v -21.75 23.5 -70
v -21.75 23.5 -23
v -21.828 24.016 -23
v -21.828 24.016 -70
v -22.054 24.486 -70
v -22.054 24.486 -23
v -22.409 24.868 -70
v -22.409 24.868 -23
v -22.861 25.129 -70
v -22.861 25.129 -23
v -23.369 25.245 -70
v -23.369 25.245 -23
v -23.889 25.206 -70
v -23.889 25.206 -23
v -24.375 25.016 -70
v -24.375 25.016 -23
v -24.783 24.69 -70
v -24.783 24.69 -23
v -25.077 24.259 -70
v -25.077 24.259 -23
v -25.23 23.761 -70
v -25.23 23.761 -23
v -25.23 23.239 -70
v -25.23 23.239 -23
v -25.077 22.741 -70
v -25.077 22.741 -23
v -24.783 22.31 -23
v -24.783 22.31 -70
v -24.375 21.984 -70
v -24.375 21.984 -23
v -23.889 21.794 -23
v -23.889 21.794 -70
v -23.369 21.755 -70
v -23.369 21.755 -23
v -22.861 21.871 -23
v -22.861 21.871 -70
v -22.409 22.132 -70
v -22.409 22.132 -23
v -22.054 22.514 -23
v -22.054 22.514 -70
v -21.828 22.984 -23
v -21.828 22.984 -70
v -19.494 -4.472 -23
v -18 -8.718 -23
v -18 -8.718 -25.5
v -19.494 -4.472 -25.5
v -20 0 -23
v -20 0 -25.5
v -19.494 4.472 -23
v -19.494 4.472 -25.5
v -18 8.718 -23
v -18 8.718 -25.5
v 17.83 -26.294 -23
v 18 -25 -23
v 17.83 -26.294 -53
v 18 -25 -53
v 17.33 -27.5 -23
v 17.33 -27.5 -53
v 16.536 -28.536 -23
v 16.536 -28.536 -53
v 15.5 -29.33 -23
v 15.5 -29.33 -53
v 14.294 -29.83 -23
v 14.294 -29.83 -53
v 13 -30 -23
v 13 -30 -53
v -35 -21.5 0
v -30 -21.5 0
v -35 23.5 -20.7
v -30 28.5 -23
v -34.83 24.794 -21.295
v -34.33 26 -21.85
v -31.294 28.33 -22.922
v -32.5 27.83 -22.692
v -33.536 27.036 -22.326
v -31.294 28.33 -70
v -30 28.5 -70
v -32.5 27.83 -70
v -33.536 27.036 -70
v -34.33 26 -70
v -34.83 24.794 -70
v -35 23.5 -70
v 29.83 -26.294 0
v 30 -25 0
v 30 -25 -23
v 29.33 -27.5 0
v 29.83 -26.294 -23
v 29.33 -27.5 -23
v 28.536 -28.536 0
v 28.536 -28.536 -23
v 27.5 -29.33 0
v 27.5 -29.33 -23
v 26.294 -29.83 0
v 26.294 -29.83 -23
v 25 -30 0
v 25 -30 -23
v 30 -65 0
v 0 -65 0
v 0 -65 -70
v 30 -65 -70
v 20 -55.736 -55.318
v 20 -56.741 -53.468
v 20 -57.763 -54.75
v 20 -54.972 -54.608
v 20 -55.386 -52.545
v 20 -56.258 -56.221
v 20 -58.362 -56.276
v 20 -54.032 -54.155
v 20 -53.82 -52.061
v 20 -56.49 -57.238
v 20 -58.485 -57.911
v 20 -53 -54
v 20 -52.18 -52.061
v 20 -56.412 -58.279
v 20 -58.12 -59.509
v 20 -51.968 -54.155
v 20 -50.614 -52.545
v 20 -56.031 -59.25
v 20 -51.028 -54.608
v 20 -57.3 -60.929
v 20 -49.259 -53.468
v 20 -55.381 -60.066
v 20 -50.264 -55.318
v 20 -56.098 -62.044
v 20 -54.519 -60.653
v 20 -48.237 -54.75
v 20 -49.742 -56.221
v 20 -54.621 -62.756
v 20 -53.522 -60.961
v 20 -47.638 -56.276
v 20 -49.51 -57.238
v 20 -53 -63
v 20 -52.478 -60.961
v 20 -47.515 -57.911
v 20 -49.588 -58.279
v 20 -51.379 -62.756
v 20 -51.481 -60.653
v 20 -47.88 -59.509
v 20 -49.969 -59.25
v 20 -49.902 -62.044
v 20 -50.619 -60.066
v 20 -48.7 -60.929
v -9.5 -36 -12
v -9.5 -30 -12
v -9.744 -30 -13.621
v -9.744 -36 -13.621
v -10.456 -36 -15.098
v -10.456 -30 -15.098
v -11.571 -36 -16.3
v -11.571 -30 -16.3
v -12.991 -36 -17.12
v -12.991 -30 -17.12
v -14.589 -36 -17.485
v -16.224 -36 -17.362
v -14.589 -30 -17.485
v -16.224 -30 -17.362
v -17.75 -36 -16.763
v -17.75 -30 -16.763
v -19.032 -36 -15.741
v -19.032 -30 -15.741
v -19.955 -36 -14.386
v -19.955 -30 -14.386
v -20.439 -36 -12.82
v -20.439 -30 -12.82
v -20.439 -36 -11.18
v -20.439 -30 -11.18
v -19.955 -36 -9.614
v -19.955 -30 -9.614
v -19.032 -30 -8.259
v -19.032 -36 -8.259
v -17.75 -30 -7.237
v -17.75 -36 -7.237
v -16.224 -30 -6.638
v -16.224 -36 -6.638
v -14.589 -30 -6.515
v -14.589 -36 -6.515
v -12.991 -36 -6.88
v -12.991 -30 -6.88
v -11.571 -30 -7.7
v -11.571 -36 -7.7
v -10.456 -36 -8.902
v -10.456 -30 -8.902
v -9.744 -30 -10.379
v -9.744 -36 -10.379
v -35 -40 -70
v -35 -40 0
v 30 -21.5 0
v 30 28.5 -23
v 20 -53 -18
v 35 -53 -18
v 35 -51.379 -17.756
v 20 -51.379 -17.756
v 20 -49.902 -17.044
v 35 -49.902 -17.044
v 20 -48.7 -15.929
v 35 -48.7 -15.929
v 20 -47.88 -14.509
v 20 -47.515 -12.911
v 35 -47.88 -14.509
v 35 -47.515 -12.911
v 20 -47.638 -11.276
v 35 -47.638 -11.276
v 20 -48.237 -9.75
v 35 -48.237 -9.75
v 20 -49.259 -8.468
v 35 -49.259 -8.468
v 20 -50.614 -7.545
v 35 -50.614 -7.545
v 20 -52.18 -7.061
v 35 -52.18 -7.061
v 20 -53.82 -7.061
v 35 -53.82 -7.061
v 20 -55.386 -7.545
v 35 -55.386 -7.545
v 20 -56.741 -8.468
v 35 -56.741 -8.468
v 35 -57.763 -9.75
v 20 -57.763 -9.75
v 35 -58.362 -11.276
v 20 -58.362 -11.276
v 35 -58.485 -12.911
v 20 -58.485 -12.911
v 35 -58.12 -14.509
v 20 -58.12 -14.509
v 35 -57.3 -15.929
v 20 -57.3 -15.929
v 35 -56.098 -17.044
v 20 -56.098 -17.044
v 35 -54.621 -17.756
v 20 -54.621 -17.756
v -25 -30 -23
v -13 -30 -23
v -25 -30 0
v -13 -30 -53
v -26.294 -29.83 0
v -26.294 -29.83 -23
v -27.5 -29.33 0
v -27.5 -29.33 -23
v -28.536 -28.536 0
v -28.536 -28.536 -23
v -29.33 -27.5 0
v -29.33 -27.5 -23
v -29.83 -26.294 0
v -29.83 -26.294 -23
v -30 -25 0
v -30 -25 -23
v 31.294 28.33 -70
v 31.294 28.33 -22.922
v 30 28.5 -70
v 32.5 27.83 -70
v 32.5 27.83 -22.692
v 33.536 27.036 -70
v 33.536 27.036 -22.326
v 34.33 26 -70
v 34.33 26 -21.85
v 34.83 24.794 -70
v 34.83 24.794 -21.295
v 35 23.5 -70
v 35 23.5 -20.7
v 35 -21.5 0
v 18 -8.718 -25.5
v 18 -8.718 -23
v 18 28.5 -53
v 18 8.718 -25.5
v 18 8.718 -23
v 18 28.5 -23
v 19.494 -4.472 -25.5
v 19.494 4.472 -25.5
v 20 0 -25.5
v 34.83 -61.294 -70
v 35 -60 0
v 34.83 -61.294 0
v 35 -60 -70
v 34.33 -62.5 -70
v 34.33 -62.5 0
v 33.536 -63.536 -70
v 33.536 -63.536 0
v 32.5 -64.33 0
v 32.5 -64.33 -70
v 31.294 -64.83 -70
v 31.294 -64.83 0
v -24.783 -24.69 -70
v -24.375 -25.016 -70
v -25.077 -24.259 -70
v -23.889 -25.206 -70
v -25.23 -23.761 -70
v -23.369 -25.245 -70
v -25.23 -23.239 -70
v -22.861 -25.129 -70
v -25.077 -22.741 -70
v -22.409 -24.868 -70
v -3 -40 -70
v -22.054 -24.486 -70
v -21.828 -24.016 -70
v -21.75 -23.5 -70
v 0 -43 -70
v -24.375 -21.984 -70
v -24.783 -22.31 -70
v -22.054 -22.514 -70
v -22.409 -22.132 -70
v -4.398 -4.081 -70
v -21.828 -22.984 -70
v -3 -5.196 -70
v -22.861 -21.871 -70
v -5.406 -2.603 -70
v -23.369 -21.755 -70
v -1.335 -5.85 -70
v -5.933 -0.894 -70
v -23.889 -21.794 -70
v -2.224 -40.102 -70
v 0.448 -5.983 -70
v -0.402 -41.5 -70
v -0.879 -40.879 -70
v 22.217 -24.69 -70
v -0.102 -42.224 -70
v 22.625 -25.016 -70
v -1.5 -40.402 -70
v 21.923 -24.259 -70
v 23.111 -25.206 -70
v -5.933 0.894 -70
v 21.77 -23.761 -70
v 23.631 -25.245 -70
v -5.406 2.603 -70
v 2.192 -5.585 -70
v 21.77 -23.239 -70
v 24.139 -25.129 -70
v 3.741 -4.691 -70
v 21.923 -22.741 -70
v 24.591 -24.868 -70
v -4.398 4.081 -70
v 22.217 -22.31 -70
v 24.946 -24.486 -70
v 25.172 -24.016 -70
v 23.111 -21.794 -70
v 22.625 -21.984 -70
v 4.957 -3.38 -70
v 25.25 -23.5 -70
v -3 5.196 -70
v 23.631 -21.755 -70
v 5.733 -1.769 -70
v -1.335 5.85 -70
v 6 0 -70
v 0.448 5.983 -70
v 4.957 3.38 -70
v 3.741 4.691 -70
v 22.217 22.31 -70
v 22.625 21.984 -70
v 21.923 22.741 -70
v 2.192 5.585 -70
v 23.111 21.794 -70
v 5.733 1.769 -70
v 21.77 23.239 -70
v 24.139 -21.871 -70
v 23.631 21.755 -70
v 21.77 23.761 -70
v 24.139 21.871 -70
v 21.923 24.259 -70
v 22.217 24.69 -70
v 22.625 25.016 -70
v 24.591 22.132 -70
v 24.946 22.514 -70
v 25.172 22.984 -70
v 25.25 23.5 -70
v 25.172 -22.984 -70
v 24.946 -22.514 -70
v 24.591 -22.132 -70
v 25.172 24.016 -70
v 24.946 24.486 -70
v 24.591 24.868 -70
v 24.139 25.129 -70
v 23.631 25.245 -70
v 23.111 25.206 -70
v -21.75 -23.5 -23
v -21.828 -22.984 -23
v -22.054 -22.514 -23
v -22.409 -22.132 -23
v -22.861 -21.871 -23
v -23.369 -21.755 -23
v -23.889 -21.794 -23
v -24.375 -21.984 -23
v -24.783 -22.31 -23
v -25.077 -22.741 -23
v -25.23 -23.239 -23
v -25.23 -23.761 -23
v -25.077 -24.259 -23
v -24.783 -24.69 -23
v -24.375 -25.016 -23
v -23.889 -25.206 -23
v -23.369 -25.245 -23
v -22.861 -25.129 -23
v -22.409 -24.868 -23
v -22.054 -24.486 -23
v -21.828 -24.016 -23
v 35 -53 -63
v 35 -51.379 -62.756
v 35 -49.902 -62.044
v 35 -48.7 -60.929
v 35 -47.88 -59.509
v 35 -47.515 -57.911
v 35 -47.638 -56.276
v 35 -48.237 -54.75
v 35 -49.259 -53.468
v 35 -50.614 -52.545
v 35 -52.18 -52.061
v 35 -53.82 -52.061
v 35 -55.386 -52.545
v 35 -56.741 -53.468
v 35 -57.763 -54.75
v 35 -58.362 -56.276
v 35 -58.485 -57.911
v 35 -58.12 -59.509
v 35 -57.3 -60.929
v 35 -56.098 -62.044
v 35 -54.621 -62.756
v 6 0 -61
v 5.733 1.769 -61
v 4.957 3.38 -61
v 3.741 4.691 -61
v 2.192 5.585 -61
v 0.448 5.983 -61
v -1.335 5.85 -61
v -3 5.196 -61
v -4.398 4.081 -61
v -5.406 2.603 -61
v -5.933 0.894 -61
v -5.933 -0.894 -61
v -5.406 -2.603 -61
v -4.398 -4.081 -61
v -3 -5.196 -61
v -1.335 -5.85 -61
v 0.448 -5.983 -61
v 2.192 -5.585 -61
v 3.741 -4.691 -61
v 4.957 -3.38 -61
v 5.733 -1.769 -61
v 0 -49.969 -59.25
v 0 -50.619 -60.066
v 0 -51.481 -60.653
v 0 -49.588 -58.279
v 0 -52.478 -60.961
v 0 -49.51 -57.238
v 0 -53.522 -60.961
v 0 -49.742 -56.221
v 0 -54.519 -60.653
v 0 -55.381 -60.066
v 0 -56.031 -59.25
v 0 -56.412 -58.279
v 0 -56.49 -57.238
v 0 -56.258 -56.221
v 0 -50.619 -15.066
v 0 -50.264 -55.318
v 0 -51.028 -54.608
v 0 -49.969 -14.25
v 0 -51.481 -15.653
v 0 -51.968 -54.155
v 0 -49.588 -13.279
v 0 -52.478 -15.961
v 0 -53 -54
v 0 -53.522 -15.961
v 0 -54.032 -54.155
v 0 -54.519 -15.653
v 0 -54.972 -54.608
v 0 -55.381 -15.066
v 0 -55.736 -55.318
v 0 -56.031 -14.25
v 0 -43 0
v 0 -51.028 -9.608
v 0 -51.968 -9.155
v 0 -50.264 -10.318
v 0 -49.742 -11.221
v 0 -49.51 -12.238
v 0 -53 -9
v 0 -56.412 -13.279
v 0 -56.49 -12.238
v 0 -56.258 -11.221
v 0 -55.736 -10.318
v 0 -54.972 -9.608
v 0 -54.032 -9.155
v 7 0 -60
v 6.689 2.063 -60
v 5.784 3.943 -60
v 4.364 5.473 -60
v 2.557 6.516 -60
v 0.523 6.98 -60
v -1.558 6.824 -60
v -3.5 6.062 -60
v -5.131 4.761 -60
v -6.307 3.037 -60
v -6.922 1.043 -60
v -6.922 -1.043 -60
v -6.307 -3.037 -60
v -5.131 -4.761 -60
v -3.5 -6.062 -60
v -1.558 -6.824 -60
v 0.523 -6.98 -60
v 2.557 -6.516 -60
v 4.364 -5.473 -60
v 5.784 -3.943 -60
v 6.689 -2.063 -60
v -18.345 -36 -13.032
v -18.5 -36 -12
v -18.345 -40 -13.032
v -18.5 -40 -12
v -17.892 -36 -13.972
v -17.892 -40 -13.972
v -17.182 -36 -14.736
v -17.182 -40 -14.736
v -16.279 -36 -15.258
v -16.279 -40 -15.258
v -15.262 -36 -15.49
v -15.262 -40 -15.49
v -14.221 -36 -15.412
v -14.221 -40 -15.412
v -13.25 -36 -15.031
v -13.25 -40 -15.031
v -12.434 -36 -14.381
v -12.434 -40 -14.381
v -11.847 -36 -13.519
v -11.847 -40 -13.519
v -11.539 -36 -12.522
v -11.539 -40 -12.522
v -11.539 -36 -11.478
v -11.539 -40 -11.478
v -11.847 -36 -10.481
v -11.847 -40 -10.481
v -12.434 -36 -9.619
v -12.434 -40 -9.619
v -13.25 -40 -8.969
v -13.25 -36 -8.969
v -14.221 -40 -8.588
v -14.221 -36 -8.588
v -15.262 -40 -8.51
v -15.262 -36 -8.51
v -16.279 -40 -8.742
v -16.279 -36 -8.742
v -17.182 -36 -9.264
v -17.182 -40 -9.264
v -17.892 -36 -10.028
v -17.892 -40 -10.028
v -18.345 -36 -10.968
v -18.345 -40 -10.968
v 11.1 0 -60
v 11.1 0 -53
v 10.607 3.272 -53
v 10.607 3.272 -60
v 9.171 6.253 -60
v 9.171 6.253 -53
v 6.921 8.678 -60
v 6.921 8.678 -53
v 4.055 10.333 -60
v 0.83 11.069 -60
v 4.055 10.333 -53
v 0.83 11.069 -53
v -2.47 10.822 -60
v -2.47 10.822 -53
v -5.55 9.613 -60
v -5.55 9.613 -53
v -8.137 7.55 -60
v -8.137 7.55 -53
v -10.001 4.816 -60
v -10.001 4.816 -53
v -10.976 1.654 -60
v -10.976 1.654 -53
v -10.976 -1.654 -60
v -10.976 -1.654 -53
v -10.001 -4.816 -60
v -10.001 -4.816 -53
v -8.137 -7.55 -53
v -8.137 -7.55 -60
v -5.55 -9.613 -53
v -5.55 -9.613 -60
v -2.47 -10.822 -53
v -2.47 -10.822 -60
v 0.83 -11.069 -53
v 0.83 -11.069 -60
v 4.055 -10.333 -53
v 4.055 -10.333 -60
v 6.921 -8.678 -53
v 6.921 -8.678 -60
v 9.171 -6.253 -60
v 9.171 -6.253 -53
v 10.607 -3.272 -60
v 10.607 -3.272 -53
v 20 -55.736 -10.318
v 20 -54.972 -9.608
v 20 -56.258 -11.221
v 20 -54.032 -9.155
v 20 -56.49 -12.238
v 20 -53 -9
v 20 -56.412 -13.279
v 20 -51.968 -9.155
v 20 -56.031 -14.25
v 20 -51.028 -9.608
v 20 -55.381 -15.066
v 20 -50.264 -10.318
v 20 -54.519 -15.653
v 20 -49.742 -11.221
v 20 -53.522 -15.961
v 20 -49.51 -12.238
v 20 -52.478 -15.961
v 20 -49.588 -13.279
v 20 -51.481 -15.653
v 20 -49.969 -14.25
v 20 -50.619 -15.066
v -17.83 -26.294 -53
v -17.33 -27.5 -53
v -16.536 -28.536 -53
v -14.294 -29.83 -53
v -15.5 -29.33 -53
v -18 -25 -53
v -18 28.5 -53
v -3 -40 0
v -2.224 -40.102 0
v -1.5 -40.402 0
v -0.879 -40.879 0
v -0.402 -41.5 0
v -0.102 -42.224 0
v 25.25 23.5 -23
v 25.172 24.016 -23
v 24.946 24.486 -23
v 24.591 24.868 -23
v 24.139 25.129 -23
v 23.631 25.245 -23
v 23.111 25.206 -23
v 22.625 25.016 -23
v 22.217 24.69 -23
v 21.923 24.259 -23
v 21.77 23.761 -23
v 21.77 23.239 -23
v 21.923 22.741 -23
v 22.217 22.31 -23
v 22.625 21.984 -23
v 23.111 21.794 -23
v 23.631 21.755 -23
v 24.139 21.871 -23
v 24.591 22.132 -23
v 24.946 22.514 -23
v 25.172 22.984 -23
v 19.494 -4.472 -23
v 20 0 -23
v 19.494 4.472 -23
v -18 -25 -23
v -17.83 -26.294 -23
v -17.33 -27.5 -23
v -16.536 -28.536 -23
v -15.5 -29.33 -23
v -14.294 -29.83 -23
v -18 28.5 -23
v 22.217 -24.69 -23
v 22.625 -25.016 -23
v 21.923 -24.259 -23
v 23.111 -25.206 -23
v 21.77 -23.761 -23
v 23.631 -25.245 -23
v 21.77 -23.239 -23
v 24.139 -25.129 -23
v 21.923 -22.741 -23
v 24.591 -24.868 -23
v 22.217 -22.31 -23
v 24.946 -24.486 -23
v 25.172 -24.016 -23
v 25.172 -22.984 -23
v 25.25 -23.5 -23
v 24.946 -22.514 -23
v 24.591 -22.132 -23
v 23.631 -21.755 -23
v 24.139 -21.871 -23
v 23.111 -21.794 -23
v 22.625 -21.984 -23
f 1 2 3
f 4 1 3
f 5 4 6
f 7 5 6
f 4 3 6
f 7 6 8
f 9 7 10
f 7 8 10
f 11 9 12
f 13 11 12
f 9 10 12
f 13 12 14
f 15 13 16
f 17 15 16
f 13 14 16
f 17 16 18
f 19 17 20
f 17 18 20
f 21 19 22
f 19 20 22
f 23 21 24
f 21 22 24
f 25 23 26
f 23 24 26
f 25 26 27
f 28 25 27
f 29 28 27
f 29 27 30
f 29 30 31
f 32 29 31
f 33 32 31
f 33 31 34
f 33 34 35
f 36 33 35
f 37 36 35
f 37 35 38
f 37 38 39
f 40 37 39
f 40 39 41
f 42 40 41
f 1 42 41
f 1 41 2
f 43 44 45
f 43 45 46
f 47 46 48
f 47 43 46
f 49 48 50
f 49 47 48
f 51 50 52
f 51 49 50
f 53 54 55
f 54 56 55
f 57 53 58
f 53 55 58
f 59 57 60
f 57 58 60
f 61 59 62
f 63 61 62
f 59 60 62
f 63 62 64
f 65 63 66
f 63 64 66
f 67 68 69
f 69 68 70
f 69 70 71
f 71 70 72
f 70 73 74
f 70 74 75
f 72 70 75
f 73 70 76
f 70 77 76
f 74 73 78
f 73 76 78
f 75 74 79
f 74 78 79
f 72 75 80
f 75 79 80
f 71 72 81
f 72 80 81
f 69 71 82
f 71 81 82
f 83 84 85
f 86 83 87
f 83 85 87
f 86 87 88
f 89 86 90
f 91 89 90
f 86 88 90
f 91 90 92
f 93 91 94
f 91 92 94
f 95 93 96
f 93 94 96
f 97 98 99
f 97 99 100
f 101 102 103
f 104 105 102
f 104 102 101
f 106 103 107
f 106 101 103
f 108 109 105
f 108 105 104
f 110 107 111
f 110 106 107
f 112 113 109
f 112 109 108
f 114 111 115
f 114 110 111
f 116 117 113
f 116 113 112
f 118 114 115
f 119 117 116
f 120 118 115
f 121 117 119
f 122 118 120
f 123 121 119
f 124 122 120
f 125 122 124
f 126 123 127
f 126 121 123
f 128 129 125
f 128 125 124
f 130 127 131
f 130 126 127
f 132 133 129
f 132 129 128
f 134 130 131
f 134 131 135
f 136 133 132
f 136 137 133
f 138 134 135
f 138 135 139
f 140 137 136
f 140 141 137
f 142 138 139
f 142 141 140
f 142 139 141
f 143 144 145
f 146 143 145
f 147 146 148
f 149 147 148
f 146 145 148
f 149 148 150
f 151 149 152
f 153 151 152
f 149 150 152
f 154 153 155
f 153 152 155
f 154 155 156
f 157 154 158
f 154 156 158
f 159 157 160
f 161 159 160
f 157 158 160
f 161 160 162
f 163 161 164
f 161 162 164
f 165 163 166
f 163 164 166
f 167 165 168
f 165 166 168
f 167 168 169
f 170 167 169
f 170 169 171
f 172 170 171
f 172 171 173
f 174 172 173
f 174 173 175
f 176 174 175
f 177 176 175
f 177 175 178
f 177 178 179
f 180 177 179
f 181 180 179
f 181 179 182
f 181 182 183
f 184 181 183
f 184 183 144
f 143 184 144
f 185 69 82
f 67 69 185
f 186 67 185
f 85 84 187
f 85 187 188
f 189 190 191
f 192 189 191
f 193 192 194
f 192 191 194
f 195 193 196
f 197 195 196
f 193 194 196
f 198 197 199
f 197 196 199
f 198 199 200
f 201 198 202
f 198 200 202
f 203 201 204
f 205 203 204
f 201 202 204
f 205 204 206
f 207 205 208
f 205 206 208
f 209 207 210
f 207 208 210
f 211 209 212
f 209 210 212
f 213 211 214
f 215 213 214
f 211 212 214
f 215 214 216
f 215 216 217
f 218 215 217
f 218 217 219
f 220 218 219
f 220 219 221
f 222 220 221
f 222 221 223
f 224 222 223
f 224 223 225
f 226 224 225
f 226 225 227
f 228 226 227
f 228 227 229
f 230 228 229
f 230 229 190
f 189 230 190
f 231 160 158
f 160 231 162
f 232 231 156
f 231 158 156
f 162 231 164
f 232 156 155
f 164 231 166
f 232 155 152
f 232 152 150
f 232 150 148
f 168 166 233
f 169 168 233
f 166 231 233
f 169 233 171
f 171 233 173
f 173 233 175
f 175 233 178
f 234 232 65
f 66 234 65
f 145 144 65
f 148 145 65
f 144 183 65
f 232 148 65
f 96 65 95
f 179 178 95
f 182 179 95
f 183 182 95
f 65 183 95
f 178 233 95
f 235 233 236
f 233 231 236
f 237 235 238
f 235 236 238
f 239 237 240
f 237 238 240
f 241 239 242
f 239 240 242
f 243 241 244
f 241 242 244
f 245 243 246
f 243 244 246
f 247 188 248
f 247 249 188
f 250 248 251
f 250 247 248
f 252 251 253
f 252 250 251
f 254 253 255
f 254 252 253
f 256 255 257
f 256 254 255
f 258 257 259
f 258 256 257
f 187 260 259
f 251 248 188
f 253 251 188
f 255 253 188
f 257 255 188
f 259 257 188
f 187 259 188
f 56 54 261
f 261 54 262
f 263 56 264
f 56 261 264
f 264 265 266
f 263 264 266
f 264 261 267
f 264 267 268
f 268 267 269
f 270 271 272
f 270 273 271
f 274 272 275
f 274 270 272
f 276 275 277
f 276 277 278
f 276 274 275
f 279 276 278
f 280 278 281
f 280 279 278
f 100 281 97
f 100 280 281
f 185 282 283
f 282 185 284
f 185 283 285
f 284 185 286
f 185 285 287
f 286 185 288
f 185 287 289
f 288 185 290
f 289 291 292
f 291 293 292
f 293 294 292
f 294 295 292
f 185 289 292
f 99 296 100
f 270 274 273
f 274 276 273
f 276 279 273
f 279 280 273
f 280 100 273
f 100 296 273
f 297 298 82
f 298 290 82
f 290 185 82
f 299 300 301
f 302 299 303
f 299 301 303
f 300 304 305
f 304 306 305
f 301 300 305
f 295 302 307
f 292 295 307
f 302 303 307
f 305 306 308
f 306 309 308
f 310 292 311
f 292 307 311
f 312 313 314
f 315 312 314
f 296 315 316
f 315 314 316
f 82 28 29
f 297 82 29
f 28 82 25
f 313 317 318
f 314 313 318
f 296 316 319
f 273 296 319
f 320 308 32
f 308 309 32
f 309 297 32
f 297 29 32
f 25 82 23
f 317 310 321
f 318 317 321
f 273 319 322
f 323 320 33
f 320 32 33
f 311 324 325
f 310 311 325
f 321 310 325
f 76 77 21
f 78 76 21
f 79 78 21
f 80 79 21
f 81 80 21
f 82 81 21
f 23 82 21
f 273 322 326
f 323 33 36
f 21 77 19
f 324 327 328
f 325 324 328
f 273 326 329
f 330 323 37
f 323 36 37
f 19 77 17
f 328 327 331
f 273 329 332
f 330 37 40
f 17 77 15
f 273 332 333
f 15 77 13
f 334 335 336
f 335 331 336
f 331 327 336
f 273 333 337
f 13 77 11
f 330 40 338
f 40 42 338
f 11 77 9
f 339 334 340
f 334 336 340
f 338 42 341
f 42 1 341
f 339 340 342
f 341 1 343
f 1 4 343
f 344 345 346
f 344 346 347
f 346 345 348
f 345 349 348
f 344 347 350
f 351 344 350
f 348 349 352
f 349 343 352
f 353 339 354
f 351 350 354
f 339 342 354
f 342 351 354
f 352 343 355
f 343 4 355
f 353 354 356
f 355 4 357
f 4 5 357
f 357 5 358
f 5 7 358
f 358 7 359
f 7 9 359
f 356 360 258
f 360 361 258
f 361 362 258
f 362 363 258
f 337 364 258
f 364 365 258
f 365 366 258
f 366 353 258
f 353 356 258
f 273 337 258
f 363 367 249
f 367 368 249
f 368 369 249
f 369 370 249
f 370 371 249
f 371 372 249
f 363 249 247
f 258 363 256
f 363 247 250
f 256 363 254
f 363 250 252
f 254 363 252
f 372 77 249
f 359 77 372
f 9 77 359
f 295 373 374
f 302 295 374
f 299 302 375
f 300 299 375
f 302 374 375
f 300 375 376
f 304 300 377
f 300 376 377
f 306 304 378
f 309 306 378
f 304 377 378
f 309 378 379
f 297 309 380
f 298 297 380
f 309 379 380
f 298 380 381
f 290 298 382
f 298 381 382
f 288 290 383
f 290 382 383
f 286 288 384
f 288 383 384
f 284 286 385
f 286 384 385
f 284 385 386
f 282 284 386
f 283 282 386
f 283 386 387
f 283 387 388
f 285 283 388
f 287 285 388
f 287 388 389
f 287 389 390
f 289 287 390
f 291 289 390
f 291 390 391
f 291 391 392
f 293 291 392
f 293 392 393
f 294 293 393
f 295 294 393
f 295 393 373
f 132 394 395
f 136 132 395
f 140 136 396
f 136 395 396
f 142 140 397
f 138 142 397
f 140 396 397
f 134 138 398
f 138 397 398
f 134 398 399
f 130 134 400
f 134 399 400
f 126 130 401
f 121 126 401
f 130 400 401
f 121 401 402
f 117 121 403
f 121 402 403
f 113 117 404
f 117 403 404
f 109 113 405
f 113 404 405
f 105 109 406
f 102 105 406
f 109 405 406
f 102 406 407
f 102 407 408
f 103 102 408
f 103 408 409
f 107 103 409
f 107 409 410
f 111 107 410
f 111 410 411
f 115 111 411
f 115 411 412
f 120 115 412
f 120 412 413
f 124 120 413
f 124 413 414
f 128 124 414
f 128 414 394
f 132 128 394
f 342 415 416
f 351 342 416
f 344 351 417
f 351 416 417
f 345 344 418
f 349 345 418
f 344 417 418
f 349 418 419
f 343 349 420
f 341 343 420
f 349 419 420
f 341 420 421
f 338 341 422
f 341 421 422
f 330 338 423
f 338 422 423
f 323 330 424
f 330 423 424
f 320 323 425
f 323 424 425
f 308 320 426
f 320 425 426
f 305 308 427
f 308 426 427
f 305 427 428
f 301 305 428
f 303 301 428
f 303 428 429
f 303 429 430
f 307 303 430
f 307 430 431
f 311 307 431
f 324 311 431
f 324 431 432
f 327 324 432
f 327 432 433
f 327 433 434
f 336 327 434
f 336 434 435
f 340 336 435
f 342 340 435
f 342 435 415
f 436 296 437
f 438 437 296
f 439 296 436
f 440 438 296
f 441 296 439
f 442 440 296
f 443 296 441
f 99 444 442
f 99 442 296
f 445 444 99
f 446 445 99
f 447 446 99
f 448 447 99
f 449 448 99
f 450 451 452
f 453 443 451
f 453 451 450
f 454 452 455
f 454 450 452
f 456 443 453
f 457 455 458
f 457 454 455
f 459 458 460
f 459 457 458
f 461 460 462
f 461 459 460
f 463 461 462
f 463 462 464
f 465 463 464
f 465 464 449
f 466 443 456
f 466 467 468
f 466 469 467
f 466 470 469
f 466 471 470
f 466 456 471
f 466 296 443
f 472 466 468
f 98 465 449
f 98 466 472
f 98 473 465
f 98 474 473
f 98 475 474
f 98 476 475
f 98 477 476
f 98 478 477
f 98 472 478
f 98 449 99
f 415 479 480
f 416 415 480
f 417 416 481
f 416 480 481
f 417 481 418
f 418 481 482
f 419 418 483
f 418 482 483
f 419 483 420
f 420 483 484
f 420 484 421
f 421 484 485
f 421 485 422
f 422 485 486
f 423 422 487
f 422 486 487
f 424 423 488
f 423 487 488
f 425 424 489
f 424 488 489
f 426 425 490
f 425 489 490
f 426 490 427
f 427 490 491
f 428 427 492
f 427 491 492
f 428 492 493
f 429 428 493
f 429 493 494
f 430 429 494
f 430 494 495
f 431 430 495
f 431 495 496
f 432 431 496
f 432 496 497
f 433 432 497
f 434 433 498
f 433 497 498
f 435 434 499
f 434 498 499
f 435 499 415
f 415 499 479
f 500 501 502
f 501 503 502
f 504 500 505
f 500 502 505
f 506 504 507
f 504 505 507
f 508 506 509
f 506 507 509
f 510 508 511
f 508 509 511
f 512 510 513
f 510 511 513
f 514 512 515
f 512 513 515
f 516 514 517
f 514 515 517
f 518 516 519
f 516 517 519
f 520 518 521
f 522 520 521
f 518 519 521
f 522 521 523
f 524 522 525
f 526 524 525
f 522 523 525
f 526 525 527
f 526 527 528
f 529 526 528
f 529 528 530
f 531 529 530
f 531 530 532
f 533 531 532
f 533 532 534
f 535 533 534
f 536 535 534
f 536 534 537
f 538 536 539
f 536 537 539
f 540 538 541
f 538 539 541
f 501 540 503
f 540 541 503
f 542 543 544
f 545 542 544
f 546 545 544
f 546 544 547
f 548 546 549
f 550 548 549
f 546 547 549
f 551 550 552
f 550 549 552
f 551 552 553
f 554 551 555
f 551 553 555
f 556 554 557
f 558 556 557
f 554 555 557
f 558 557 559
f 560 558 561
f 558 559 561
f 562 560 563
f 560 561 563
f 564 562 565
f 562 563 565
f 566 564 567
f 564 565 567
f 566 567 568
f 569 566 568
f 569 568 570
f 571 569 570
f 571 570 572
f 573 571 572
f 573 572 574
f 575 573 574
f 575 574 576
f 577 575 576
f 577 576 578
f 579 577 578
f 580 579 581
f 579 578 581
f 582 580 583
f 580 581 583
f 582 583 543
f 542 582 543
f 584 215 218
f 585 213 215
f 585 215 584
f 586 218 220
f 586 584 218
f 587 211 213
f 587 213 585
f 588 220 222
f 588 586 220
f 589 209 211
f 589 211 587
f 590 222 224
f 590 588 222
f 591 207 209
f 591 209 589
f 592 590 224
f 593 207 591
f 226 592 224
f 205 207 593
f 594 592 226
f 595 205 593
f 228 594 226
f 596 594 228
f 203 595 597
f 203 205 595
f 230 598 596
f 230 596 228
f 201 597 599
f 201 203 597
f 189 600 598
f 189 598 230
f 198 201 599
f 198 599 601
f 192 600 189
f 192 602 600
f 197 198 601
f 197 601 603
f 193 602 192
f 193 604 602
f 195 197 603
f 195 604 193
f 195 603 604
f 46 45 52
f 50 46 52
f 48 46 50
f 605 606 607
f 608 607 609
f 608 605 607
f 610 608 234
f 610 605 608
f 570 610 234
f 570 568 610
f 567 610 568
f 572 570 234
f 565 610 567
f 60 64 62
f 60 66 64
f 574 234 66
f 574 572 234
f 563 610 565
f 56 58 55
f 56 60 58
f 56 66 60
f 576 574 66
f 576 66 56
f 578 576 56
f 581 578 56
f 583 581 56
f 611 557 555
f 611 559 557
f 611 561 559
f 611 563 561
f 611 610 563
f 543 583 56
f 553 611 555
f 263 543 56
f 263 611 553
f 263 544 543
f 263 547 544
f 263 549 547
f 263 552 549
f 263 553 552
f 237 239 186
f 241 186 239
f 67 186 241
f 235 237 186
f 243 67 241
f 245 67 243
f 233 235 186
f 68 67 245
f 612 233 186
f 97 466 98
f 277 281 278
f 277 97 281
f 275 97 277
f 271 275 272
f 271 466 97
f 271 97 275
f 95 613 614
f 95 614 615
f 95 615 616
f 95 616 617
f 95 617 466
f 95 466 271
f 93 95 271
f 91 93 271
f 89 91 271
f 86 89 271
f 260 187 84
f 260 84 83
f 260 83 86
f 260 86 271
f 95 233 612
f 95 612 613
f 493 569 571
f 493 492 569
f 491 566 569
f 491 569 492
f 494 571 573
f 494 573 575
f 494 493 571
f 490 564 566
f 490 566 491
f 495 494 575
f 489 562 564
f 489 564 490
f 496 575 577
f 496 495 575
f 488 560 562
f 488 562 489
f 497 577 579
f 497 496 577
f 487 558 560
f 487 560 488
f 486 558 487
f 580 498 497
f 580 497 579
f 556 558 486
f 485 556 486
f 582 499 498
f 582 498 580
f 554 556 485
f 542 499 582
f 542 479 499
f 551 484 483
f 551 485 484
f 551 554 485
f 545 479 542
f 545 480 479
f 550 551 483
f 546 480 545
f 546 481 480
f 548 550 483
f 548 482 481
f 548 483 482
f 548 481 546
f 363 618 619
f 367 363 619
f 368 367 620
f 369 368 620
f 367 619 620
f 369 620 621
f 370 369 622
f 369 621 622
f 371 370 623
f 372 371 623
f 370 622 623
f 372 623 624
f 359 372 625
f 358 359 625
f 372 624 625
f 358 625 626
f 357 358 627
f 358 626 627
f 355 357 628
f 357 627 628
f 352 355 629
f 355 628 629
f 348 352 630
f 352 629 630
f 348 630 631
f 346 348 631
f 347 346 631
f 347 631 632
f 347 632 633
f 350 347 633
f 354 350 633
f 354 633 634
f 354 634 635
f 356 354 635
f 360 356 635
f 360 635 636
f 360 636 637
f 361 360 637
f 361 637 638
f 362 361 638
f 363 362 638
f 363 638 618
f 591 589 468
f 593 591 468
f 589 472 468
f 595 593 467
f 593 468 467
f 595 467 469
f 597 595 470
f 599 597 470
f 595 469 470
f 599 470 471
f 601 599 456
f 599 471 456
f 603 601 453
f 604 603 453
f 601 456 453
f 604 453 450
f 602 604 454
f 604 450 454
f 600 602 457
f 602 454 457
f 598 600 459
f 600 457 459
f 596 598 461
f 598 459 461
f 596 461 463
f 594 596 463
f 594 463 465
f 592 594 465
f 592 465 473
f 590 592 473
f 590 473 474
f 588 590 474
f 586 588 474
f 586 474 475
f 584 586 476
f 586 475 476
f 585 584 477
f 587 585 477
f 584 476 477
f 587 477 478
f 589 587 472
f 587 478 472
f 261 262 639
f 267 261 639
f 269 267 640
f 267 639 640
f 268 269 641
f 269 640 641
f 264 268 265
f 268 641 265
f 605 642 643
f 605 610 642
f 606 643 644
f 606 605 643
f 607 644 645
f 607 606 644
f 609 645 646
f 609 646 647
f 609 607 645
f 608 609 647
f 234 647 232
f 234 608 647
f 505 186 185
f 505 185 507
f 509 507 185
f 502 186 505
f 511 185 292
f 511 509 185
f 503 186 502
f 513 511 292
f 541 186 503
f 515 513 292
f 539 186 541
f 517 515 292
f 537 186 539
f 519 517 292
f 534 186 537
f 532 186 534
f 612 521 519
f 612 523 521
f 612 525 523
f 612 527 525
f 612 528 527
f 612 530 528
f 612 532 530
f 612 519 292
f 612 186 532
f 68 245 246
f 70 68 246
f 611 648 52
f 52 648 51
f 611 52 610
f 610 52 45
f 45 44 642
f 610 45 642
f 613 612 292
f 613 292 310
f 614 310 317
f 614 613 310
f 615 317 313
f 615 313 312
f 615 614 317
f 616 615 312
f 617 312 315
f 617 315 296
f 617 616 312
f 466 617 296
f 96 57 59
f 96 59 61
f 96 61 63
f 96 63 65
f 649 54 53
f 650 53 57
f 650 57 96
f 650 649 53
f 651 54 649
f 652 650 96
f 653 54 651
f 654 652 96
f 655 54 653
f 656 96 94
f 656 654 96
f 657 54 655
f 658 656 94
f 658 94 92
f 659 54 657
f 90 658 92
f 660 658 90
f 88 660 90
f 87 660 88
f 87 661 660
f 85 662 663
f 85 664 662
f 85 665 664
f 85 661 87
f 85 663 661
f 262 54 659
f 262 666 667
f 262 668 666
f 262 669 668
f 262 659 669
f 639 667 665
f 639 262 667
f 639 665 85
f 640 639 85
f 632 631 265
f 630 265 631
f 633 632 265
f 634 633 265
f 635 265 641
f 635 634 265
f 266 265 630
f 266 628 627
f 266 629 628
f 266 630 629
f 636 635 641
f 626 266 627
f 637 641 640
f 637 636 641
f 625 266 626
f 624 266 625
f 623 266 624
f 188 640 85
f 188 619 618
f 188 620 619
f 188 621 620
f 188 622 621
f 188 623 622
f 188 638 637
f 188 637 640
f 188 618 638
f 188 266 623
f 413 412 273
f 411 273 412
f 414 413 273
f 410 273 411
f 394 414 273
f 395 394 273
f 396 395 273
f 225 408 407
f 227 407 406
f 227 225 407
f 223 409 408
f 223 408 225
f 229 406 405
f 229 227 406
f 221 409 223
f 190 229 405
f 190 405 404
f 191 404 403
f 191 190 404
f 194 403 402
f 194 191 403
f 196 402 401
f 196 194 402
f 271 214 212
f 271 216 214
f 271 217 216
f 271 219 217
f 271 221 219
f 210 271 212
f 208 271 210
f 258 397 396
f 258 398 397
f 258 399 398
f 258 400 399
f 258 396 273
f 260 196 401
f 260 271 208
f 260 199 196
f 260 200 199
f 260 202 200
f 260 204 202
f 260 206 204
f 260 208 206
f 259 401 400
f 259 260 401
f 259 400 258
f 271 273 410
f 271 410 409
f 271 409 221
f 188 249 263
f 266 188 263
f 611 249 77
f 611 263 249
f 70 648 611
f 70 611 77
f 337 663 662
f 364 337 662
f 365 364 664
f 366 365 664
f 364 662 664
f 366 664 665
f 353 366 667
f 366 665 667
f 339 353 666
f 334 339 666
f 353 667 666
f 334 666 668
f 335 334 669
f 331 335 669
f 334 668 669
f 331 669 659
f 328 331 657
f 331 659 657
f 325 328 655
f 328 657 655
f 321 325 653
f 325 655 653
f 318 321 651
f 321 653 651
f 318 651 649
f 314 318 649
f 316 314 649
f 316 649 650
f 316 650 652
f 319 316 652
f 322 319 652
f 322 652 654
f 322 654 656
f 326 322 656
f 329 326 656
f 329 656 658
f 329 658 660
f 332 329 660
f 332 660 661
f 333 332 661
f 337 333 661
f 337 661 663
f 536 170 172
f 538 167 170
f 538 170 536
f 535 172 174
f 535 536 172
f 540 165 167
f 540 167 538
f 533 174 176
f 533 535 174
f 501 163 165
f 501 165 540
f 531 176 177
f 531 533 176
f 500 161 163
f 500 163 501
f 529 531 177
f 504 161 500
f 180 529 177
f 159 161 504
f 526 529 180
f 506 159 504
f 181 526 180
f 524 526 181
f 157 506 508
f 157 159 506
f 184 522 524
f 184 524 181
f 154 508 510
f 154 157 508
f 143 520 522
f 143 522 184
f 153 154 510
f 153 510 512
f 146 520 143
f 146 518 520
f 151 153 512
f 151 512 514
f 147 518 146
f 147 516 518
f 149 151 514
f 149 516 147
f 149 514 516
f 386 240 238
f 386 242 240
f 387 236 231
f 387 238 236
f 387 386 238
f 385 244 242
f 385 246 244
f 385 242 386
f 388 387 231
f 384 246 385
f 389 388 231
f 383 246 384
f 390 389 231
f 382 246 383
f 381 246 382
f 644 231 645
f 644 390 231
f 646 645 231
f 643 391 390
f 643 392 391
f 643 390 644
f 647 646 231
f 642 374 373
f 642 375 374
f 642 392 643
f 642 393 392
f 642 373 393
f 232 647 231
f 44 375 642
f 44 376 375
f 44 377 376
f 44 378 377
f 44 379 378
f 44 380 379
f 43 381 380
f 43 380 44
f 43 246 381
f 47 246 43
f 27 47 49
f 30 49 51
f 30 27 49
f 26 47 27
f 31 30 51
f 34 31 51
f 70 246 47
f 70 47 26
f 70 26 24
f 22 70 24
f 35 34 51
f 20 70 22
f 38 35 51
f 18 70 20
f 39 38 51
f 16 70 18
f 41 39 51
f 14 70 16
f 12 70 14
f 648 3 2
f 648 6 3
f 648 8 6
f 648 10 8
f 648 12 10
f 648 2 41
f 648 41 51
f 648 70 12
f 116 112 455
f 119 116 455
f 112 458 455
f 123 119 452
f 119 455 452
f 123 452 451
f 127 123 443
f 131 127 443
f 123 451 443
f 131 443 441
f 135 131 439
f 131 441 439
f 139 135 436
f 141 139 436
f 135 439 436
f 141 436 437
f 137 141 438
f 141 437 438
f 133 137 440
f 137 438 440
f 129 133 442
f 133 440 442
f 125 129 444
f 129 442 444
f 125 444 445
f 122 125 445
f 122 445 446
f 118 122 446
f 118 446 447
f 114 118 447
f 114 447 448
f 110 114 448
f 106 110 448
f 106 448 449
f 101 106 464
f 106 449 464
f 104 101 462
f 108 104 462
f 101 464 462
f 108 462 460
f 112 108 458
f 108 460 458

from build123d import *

# Parameters (mm, degrees)
SKETCH1_R                                       = 1.75
SKETCH1_R_2                                     = 6
BOSS_EXTRUDE1_DEPTH                             = 70
SKETCH2_W                                       = 60
SKETCH2_H                                       = 58.5
CUT_EXTRUDE2_DEPTH                              = 23
CUT_EXTRUDE3_DEPTH                              = 53
CUT_EXTRUDE5_START                              = -23
CUT_EXTRUDE5_DEPTH                              = 2.5
SKETCH5_R                                       = 11.1
CUT_EXTRUDE4_DEPTH                              = 7
CHAMFER1_SIZE                                   = 50
CHAMFER1_SIZE2                                  = 23
FILLET1_R                                       = 5
FILLET2_R                                       = 5
CBORE_FOR_M6_SOCKET_HEAD_CAP_SCREW1_D           = 7
CBORE_FOR_M6_SOCKET_HEAD_CAP_SCREW1_CBORE_D     = 11
CBORE_FOR_M6_SOCKET_HEAD_CAP_SCREW1_CBORE_DEPTH = 6
CBORE_FOR_M6_SOCKET_HEAD_CAP_SCREW2_D           = 7
CBORE_FOR_M6_SOCKET_HEAD_CAP_SCREW2_CBORE_D     = 11
CBORE_FOR_M6_SOCKET_HEAD_CAP_SCREW2_CBORE_DEPTH = 15
CHAMFER2_SIZE                                   = 1


with BuildPart() as part:
    # Sketch1 → Boss-Extrude1 (new body)
    with BuildSketch(Plane.XY):
        with BuildLine():
            Line((35, 28.5), (-35, 28.5))
            Line((-35, 28.5), (-35, -25))
            Line((-35, -25), (-35, -40))
            Line((-35, -40), (-3, -40))
            ThreePointArc((-3, -40), (-0.878679656, -40.878679656), (0, -43))
            Line((0, -43), (0, -65))
            Line((0, -65), (35, -65))
            Line((35, -65), (35, -25))
            Line((35, -25), (35, 28.5))
        make_face()
        with Locations((-23.5, -23.5)):
            Circle(SKETCH1_R, mode=Mode.SUBTRACT)
        with Locations((23.5, -23.5)):
            Circle(SKETCH1_R, mode=Mode.SUBTRACT)
        Circle(SKETCH1_R_2, mode=Mode.SUBTRACT)
        with Locations((-23.5, 23.5)):
            Circle(SKETCH1_R, mode=Mode.SUBTRACT)
        with Locations((23.5, 23.5)):
            Circle(SKETCH1_R, mode=Mode.SUBTRACT)
    extrude(amount=-BOSS_EXTRUDE1_DEPTH)

    # Sketch2 → Cut-Extrude2 (cut)
    with BuildSketch(Plane.XY):
        with Locations((0, -0.75)):
            Rectangle(SKETCH2_W, SKETCH2_H)
    extrude(amount=-CUT_EXTRUDE2_DEPTH, mode=Mode.SUBTRACT)

    # Sketch6 → Cut-Extrude3 (cut)
    with BuildSketch(Plane.XY):
        Polygon((-18, -8.717797887), (-18, -30), (18, -30), (18, -8.717797887), (18, 8.717797887), (18, 28.5), (-18, 28.5), (-18, 8.717797887), align=None)
    extrude(amount=-CUT_EXTRUDE3_DEPTH, mode=Mode.SUBTRACT)

    # Sketch6<4> → Cut-Extrude5 (cut)
    with BuildSketch(Plane.XY.offset(CUT_EXTRUDE5_START)):
        with BuildLine():
            Line((-18, 8.717797887), (-18, -8.717797887))
            ThreePointArc((-18, -8.717797887), (-20, 0), (-18, 8.717797887))
        make_face()
        with BuildLine():
            Line((18, 8.717797887), (18, -8.717797887))
            ThreePointArc((18, -8.717797887), (20, 0), (18, 8.717797887))
        make_face()
    extrude(amount=-CUT_EXTRUDE5_DEPTH, mode=Mode.SUBTRACT)

    # Sketch5 → Cut-Extrude4 (cut)
    with BuildSketch(Plane.XY.offset(-53)):
        Circle(SKETCH5_R)
    extrude(amount=-CUT_EXTRUDE4_DEPTH, mode=Mode.SUBTRACT)

    # Chamfer1
    chamfer1_edges = [part.edges().sort_by_distance(p)[0] for p in [
        (32.5, 28.5, 0),
        (-32.5, 28.5, 0),
    ]]
    chamfer1_side = [part.faces().sort_by_distance(p)[0] for p in [
        (7.08218847, -32.820097977, 0),
    ]]
    chamfer(chamfer1_edges, length=CHAMFER1_SIZE, length2=CHAMFER1_SIZE2, reference=chamfer1_side[0])

    # Fillet1
    fillet1_edges = [part.edges().sort_by_distance(p)[0] for p in [
        (35, -65, -35),
        (35, 28.5, -46.5),
        (-35, 28.5, -46.5),
    ]]
    fillet(fillet1_edges, radius=FILLET1_R)

    # Fillet2
    fillet2_edges = [part.edges().sort_by_distance(p)[0] for p in [
        (30, -30, -11.5),
        (-30, -30, -11.5),
        (18, -30, -38),
        (-18, -30, -38),
    ]]
    fillet(fillet2_edges, radius=FILLET2_R)

    # CBORE for M6 Socket Head Cap Screw1 (through all)
    with Locations(Plane(origin=(-15, -30, -12), x_dir=(1, 0, 0), z_dir=(0, 1, 0))):
        with Locations((0, 0)):
            CounterBoreHole(CBORE_FOR_M6_SOCKET_HEAD_CAP_SCREW1_D / 2, CBORE_FOR_M6_SOCKET_HEAD_CAP_SCREW1_CBORE_D / 2, CBORE_FOR_M6_SOCKET_HEAD_CAP_SCREW1_CBORE_DEPTH)

    # CBORE for M6 Socket Head Cap Screw2 (through all)
    with Locations(Plane(origin=(35, 0, 0), x_dir=(0, 0, -1), z_dir=(1, 0, 0))):
        with Locations((12.5, -53), (57.5, -53)):
            CounterBoreHole(CBORE_FOR_M6_SOCKET_HEAD_CAP_SCREW2_D / 2, CBORE_FOR_M6_SOCKET_HEAD_CAP_SCREW2_CBORE_D / 2, CBORE_FOR_M6_SOCKET_HEAD_CAP_SCREW2_CBORE_DEPTH)

    # Chamfer2
    chamfer2_edges = [part.edges().sort_by_distance(p)[0] for p in [
        (-6, 0, -60),
    ]]
    chamfer(chamfer2_edges, length=CHAMFER2_SIZE)


solid = part.part
